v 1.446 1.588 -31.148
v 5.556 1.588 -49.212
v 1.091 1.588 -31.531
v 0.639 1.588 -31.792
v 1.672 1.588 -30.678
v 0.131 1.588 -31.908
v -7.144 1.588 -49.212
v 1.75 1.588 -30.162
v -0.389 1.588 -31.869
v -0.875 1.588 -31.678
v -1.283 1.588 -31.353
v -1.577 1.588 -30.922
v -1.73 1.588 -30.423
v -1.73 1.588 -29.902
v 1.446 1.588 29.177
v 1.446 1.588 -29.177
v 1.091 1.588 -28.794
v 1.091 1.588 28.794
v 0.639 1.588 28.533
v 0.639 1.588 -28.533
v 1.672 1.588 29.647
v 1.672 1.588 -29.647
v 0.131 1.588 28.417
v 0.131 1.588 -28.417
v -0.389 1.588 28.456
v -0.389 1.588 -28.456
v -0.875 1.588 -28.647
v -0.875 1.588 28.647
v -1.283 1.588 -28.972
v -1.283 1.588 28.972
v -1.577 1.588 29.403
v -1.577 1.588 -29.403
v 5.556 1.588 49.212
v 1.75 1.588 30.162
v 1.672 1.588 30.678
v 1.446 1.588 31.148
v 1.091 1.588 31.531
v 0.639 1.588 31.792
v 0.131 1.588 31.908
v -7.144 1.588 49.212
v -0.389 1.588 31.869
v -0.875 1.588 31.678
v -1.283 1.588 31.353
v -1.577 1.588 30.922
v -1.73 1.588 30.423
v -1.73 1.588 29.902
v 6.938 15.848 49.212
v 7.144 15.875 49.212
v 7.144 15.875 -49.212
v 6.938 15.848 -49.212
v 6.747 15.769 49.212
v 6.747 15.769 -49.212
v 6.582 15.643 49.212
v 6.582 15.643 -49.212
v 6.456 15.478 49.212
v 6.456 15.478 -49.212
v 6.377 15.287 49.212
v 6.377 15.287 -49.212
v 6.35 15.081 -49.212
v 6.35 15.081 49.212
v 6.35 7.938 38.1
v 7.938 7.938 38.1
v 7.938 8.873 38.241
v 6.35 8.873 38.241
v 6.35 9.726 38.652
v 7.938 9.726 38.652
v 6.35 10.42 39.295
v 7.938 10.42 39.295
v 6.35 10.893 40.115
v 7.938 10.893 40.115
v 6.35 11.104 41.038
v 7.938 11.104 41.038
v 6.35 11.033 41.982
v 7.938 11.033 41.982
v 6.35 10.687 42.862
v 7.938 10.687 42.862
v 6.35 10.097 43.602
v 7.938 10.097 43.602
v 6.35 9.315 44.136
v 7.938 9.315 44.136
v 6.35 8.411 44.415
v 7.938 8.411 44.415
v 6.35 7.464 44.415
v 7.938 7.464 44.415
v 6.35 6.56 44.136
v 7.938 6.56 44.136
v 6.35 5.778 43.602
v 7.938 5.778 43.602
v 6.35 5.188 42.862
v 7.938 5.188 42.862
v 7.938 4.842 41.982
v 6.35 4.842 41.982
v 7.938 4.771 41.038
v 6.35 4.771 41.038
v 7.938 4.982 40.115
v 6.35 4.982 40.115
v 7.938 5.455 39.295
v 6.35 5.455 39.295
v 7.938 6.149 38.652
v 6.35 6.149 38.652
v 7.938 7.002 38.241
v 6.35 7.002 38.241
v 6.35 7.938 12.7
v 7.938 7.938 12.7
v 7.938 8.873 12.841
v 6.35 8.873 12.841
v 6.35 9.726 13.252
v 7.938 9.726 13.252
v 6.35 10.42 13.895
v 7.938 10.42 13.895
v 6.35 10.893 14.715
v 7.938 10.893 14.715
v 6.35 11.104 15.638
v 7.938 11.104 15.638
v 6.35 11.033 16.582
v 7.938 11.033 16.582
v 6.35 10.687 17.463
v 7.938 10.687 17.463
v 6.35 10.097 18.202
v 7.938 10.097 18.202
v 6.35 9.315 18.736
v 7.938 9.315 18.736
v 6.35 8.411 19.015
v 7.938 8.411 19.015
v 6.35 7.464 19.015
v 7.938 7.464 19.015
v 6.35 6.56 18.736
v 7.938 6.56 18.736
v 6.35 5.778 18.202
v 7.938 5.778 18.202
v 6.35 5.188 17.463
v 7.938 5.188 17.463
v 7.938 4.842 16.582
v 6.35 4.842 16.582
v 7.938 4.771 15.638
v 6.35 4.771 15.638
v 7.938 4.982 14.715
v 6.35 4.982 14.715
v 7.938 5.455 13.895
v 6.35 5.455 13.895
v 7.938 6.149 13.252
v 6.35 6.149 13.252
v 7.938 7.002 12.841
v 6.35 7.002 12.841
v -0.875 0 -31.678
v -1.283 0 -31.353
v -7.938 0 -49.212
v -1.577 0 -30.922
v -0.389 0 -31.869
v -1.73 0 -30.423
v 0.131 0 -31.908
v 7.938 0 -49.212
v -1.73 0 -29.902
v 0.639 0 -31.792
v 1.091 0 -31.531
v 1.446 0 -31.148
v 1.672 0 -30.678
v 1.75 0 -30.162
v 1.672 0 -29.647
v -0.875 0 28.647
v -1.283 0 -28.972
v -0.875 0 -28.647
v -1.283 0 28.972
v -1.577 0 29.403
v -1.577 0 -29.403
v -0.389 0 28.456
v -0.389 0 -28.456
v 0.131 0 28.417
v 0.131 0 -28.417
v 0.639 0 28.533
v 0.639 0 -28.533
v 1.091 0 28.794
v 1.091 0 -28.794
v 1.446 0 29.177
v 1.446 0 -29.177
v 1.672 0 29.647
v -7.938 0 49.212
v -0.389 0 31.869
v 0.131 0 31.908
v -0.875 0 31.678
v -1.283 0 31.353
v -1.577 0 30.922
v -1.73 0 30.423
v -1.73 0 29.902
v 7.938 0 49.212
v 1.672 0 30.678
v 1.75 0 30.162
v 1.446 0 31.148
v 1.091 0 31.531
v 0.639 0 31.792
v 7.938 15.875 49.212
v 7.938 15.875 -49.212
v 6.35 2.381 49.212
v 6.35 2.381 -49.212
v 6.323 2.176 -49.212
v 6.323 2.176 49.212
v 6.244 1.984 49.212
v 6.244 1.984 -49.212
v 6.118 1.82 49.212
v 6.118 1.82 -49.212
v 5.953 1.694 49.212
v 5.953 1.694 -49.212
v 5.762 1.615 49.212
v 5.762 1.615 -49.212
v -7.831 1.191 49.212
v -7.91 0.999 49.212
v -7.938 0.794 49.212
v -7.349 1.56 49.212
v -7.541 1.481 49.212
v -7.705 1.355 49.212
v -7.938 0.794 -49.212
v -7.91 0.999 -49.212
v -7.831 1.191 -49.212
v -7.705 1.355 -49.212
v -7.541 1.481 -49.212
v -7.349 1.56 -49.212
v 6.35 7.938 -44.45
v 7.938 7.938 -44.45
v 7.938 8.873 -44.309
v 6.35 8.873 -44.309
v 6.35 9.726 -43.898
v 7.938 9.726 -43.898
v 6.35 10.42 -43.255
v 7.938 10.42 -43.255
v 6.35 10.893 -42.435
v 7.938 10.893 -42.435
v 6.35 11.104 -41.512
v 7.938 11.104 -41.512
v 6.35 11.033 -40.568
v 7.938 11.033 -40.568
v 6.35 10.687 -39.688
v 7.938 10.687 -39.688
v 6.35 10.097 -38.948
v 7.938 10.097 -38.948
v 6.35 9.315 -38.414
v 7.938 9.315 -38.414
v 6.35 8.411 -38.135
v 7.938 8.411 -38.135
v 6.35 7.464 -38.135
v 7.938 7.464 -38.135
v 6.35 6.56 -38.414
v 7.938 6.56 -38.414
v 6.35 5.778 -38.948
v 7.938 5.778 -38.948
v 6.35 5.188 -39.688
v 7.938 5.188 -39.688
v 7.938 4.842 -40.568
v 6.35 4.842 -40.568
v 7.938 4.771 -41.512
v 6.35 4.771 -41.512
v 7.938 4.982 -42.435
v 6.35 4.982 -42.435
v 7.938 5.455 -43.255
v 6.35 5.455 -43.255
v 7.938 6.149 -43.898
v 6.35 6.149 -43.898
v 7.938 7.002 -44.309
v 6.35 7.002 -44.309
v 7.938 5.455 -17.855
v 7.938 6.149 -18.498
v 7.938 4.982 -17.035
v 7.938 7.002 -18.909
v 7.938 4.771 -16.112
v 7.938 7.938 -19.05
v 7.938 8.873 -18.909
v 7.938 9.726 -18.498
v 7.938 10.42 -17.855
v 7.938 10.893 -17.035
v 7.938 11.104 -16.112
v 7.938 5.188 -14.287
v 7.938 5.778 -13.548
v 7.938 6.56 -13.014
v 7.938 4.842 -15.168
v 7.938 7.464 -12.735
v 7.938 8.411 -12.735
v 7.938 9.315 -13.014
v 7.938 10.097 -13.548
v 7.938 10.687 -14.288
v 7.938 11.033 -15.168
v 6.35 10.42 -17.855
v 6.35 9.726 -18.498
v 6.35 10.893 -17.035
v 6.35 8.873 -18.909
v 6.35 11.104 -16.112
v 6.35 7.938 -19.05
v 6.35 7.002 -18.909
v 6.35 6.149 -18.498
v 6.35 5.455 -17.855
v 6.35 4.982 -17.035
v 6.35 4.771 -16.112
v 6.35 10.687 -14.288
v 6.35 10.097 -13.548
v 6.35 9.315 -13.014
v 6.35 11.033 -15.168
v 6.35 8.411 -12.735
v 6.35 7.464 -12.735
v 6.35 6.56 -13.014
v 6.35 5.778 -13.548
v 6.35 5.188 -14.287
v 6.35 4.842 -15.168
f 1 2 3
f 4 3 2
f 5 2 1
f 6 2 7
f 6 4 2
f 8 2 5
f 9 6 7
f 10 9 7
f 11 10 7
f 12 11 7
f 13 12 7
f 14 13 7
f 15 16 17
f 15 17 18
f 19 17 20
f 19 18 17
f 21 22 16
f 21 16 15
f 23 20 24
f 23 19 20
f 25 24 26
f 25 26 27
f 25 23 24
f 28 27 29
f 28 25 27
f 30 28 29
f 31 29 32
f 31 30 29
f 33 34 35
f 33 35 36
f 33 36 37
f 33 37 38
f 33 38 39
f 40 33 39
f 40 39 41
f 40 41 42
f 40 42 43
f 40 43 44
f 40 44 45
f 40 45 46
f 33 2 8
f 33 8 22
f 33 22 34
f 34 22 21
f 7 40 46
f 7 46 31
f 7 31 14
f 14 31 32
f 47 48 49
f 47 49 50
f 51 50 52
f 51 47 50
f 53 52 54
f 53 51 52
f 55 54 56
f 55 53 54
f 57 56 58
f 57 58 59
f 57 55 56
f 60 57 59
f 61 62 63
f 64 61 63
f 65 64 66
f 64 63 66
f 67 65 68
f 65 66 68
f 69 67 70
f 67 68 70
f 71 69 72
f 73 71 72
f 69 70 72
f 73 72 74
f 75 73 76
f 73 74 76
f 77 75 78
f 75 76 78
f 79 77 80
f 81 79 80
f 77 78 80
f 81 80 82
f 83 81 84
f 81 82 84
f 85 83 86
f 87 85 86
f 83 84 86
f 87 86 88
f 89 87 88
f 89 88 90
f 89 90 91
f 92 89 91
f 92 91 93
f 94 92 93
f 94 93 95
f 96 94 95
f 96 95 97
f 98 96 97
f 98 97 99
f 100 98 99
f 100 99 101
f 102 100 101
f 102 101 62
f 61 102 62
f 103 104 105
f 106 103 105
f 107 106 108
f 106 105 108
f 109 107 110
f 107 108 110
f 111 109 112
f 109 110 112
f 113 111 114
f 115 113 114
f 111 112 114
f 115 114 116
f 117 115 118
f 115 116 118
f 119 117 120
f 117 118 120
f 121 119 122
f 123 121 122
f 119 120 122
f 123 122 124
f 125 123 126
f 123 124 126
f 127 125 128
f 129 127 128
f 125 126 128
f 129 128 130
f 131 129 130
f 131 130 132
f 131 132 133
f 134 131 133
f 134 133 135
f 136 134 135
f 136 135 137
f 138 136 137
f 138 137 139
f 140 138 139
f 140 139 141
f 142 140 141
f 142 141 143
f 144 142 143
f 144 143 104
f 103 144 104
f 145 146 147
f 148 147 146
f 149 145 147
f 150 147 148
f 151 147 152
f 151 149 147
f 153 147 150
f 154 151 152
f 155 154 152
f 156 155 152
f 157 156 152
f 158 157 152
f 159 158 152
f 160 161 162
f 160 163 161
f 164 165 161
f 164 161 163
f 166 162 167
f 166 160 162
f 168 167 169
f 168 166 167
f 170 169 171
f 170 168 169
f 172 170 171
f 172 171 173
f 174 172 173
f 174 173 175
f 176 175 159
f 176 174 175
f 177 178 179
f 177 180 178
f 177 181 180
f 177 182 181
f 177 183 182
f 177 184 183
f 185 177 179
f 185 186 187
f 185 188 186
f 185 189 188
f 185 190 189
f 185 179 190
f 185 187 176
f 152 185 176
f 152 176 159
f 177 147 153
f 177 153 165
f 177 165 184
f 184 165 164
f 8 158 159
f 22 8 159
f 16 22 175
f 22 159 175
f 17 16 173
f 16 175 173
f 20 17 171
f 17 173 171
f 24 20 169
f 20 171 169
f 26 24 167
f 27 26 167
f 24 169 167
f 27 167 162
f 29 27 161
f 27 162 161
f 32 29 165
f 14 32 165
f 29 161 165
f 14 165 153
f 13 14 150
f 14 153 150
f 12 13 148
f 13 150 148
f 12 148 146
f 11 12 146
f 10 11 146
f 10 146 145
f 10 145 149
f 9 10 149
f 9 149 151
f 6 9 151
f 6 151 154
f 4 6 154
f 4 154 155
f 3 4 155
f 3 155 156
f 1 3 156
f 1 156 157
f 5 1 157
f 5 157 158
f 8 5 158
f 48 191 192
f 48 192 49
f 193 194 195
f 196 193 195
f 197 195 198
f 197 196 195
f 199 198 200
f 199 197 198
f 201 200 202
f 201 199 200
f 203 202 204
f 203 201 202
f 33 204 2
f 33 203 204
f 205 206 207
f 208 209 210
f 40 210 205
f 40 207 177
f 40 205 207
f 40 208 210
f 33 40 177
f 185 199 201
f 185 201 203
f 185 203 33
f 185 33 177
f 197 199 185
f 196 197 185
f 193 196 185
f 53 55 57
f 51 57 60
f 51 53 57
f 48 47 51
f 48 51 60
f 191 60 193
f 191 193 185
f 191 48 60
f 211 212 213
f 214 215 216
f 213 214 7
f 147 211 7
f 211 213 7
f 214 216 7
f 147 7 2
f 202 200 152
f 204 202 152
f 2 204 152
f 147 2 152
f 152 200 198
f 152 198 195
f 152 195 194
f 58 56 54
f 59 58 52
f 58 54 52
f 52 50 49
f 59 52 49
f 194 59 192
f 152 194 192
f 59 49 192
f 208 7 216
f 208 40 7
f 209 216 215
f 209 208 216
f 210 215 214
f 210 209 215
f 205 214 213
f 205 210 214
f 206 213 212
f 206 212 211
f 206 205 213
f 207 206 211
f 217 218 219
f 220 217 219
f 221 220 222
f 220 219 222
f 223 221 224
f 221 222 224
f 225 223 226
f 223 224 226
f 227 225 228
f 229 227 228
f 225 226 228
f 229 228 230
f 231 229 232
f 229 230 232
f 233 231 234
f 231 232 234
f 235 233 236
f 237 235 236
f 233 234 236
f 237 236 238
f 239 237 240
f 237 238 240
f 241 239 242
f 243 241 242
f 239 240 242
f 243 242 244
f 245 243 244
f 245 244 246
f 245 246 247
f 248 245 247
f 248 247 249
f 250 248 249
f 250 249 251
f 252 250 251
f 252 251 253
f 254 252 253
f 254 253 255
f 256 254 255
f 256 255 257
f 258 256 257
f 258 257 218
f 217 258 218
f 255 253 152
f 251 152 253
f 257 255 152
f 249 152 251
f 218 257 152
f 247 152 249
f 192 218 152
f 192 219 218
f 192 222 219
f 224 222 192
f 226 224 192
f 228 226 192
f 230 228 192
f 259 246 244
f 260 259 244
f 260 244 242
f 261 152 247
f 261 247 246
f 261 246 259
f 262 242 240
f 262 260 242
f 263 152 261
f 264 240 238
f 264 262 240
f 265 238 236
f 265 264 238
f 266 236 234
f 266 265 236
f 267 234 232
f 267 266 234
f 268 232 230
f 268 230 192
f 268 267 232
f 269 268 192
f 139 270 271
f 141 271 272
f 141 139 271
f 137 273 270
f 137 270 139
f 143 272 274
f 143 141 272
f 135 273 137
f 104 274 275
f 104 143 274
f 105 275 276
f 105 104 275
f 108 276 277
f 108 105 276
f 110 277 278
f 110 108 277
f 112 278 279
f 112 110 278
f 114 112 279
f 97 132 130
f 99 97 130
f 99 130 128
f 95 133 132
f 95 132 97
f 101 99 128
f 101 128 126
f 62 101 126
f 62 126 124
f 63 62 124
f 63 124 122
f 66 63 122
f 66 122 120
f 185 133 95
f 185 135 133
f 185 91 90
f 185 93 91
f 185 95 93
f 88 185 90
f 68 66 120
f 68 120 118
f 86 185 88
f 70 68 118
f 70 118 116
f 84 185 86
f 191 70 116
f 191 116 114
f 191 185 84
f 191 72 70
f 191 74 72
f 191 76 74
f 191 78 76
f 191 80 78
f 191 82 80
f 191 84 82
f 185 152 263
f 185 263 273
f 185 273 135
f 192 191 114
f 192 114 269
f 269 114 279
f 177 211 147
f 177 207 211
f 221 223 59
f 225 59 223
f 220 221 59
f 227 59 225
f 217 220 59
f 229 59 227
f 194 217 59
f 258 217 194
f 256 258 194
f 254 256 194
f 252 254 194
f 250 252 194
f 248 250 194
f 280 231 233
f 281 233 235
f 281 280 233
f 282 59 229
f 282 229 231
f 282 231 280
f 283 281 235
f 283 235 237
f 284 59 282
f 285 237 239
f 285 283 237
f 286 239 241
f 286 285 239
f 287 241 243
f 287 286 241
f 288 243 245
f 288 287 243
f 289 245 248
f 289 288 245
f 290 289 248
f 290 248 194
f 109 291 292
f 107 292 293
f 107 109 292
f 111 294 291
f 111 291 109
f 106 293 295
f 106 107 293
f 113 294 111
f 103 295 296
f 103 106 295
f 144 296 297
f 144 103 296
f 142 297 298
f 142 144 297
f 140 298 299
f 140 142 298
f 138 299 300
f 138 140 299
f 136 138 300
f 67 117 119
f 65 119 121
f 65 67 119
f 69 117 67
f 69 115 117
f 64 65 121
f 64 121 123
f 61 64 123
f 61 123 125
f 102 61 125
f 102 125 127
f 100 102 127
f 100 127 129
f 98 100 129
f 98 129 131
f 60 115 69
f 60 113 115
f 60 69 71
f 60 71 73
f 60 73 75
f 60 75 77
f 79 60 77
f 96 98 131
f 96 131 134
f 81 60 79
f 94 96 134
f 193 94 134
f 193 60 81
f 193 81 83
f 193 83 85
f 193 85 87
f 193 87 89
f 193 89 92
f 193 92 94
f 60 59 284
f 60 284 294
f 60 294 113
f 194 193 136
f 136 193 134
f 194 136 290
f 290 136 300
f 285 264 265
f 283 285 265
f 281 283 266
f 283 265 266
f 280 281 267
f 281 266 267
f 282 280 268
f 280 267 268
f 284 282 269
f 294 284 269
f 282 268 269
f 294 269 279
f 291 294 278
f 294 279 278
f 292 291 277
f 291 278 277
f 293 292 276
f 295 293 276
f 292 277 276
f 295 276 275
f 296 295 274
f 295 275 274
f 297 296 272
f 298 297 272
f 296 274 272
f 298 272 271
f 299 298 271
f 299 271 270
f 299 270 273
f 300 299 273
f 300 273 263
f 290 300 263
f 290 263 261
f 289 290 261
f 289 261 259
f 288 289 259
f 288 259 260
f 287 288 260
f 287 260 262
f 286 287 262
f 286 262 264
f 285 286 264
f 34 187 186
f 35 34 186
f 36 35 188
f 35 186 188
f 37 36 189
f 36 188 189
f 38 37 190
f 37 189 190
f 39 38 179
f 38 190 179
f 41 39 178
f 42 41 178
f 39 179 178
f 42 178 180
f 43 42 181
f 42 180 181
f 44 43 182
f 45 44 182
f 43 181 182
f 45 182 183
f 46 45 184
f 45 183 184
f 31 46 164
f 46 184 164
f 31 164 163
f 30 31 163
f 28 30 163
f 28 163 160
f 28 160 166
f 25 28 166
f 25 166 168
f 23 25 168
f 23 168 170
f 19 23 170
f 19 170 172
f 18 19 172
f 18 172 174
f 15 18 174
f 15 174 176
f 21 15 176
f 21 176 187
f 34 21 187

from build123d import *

# Parameters (mm, degrees)
BOSS_EXTRUDE1_DEPTH = 49.2125
SKETCH3_R           = 3.175
CUT_EXTRUDE1_DEPTH  = 16.875
SKETCH4_R           = 1.7500092
CUT_EXTRUDE2_DEPTH  = 16.875


with BuildPart() as part:
    # Sketch2 → Boss-Extrude1 (new body, symmetric)
    with BuildSketch(Plane.XY):
        with BuildLine():
            Line((-7.9375, 0), (7.9375, 0))
            Line((7.9375, 0), (7.9375, 15.875))
            Line((7.9375, 15.875), (7.14375, 15.875))
            ThreePointArc((7.14375, 15.875), (6.582483992, 15.642516008), (6.35, 15.08125))
            Line((6.35, 15.08125), (6.35, 2.38125))
            ThreePointArc((6.35, 2.38125), (6.117516008, 1.819983992), (5.55625, 1.5875))
            Line((5.55625, 1.5875), (-7.14375, 1.5875))
            ThreePointArc((-7.14375, 1.5875), (-7.705016008, 1.355016008), (-7.9375, 0.79375))
            Line((-7.9375, 0.79375), (-7.9375, 0))
        make_face()
    extrude(amount=BOSS_EXTRUDE1_DEPTH, both=True)

    # Sketch3 → Cut-Extrude1 (cut, through all)
    with BuildSketch(Plane(origin=(7.9375, 0, 0), x_dir=(0, 0, -1), z_dir=(1, 0, 0))):
        with Locations((-41.275, 7.9375)):
            Circle(SKETCH3_R)
        with Locations((41.275, 7.9375)):
            Circle(SKETCH3_R)
        with Locations((-15.875, 7.9375)):
            Circle(SKETCH3_R)
        with Locations((15.875, 7.9375)):
            Circle(SKETCH3_R)
    extrude(amount=-CUT_EXTRUDE1_DEPTH, mode=Mode.SUBTRACT)

    # Sketch4 → Cut-Extrude2 (cut, through all)
    with BuildSketch(Plane.XZ):
        with Locations((0, -30.1625)):
            Circle(SKETCH4_R)
        with Locations((0, 30.1625)):
            Circle(SKETCH4_R)
    extrude(amount=-CUT_EXTRUDE2_DEPTH, mode=Mode.SUBTRACT)


solid = part.part
